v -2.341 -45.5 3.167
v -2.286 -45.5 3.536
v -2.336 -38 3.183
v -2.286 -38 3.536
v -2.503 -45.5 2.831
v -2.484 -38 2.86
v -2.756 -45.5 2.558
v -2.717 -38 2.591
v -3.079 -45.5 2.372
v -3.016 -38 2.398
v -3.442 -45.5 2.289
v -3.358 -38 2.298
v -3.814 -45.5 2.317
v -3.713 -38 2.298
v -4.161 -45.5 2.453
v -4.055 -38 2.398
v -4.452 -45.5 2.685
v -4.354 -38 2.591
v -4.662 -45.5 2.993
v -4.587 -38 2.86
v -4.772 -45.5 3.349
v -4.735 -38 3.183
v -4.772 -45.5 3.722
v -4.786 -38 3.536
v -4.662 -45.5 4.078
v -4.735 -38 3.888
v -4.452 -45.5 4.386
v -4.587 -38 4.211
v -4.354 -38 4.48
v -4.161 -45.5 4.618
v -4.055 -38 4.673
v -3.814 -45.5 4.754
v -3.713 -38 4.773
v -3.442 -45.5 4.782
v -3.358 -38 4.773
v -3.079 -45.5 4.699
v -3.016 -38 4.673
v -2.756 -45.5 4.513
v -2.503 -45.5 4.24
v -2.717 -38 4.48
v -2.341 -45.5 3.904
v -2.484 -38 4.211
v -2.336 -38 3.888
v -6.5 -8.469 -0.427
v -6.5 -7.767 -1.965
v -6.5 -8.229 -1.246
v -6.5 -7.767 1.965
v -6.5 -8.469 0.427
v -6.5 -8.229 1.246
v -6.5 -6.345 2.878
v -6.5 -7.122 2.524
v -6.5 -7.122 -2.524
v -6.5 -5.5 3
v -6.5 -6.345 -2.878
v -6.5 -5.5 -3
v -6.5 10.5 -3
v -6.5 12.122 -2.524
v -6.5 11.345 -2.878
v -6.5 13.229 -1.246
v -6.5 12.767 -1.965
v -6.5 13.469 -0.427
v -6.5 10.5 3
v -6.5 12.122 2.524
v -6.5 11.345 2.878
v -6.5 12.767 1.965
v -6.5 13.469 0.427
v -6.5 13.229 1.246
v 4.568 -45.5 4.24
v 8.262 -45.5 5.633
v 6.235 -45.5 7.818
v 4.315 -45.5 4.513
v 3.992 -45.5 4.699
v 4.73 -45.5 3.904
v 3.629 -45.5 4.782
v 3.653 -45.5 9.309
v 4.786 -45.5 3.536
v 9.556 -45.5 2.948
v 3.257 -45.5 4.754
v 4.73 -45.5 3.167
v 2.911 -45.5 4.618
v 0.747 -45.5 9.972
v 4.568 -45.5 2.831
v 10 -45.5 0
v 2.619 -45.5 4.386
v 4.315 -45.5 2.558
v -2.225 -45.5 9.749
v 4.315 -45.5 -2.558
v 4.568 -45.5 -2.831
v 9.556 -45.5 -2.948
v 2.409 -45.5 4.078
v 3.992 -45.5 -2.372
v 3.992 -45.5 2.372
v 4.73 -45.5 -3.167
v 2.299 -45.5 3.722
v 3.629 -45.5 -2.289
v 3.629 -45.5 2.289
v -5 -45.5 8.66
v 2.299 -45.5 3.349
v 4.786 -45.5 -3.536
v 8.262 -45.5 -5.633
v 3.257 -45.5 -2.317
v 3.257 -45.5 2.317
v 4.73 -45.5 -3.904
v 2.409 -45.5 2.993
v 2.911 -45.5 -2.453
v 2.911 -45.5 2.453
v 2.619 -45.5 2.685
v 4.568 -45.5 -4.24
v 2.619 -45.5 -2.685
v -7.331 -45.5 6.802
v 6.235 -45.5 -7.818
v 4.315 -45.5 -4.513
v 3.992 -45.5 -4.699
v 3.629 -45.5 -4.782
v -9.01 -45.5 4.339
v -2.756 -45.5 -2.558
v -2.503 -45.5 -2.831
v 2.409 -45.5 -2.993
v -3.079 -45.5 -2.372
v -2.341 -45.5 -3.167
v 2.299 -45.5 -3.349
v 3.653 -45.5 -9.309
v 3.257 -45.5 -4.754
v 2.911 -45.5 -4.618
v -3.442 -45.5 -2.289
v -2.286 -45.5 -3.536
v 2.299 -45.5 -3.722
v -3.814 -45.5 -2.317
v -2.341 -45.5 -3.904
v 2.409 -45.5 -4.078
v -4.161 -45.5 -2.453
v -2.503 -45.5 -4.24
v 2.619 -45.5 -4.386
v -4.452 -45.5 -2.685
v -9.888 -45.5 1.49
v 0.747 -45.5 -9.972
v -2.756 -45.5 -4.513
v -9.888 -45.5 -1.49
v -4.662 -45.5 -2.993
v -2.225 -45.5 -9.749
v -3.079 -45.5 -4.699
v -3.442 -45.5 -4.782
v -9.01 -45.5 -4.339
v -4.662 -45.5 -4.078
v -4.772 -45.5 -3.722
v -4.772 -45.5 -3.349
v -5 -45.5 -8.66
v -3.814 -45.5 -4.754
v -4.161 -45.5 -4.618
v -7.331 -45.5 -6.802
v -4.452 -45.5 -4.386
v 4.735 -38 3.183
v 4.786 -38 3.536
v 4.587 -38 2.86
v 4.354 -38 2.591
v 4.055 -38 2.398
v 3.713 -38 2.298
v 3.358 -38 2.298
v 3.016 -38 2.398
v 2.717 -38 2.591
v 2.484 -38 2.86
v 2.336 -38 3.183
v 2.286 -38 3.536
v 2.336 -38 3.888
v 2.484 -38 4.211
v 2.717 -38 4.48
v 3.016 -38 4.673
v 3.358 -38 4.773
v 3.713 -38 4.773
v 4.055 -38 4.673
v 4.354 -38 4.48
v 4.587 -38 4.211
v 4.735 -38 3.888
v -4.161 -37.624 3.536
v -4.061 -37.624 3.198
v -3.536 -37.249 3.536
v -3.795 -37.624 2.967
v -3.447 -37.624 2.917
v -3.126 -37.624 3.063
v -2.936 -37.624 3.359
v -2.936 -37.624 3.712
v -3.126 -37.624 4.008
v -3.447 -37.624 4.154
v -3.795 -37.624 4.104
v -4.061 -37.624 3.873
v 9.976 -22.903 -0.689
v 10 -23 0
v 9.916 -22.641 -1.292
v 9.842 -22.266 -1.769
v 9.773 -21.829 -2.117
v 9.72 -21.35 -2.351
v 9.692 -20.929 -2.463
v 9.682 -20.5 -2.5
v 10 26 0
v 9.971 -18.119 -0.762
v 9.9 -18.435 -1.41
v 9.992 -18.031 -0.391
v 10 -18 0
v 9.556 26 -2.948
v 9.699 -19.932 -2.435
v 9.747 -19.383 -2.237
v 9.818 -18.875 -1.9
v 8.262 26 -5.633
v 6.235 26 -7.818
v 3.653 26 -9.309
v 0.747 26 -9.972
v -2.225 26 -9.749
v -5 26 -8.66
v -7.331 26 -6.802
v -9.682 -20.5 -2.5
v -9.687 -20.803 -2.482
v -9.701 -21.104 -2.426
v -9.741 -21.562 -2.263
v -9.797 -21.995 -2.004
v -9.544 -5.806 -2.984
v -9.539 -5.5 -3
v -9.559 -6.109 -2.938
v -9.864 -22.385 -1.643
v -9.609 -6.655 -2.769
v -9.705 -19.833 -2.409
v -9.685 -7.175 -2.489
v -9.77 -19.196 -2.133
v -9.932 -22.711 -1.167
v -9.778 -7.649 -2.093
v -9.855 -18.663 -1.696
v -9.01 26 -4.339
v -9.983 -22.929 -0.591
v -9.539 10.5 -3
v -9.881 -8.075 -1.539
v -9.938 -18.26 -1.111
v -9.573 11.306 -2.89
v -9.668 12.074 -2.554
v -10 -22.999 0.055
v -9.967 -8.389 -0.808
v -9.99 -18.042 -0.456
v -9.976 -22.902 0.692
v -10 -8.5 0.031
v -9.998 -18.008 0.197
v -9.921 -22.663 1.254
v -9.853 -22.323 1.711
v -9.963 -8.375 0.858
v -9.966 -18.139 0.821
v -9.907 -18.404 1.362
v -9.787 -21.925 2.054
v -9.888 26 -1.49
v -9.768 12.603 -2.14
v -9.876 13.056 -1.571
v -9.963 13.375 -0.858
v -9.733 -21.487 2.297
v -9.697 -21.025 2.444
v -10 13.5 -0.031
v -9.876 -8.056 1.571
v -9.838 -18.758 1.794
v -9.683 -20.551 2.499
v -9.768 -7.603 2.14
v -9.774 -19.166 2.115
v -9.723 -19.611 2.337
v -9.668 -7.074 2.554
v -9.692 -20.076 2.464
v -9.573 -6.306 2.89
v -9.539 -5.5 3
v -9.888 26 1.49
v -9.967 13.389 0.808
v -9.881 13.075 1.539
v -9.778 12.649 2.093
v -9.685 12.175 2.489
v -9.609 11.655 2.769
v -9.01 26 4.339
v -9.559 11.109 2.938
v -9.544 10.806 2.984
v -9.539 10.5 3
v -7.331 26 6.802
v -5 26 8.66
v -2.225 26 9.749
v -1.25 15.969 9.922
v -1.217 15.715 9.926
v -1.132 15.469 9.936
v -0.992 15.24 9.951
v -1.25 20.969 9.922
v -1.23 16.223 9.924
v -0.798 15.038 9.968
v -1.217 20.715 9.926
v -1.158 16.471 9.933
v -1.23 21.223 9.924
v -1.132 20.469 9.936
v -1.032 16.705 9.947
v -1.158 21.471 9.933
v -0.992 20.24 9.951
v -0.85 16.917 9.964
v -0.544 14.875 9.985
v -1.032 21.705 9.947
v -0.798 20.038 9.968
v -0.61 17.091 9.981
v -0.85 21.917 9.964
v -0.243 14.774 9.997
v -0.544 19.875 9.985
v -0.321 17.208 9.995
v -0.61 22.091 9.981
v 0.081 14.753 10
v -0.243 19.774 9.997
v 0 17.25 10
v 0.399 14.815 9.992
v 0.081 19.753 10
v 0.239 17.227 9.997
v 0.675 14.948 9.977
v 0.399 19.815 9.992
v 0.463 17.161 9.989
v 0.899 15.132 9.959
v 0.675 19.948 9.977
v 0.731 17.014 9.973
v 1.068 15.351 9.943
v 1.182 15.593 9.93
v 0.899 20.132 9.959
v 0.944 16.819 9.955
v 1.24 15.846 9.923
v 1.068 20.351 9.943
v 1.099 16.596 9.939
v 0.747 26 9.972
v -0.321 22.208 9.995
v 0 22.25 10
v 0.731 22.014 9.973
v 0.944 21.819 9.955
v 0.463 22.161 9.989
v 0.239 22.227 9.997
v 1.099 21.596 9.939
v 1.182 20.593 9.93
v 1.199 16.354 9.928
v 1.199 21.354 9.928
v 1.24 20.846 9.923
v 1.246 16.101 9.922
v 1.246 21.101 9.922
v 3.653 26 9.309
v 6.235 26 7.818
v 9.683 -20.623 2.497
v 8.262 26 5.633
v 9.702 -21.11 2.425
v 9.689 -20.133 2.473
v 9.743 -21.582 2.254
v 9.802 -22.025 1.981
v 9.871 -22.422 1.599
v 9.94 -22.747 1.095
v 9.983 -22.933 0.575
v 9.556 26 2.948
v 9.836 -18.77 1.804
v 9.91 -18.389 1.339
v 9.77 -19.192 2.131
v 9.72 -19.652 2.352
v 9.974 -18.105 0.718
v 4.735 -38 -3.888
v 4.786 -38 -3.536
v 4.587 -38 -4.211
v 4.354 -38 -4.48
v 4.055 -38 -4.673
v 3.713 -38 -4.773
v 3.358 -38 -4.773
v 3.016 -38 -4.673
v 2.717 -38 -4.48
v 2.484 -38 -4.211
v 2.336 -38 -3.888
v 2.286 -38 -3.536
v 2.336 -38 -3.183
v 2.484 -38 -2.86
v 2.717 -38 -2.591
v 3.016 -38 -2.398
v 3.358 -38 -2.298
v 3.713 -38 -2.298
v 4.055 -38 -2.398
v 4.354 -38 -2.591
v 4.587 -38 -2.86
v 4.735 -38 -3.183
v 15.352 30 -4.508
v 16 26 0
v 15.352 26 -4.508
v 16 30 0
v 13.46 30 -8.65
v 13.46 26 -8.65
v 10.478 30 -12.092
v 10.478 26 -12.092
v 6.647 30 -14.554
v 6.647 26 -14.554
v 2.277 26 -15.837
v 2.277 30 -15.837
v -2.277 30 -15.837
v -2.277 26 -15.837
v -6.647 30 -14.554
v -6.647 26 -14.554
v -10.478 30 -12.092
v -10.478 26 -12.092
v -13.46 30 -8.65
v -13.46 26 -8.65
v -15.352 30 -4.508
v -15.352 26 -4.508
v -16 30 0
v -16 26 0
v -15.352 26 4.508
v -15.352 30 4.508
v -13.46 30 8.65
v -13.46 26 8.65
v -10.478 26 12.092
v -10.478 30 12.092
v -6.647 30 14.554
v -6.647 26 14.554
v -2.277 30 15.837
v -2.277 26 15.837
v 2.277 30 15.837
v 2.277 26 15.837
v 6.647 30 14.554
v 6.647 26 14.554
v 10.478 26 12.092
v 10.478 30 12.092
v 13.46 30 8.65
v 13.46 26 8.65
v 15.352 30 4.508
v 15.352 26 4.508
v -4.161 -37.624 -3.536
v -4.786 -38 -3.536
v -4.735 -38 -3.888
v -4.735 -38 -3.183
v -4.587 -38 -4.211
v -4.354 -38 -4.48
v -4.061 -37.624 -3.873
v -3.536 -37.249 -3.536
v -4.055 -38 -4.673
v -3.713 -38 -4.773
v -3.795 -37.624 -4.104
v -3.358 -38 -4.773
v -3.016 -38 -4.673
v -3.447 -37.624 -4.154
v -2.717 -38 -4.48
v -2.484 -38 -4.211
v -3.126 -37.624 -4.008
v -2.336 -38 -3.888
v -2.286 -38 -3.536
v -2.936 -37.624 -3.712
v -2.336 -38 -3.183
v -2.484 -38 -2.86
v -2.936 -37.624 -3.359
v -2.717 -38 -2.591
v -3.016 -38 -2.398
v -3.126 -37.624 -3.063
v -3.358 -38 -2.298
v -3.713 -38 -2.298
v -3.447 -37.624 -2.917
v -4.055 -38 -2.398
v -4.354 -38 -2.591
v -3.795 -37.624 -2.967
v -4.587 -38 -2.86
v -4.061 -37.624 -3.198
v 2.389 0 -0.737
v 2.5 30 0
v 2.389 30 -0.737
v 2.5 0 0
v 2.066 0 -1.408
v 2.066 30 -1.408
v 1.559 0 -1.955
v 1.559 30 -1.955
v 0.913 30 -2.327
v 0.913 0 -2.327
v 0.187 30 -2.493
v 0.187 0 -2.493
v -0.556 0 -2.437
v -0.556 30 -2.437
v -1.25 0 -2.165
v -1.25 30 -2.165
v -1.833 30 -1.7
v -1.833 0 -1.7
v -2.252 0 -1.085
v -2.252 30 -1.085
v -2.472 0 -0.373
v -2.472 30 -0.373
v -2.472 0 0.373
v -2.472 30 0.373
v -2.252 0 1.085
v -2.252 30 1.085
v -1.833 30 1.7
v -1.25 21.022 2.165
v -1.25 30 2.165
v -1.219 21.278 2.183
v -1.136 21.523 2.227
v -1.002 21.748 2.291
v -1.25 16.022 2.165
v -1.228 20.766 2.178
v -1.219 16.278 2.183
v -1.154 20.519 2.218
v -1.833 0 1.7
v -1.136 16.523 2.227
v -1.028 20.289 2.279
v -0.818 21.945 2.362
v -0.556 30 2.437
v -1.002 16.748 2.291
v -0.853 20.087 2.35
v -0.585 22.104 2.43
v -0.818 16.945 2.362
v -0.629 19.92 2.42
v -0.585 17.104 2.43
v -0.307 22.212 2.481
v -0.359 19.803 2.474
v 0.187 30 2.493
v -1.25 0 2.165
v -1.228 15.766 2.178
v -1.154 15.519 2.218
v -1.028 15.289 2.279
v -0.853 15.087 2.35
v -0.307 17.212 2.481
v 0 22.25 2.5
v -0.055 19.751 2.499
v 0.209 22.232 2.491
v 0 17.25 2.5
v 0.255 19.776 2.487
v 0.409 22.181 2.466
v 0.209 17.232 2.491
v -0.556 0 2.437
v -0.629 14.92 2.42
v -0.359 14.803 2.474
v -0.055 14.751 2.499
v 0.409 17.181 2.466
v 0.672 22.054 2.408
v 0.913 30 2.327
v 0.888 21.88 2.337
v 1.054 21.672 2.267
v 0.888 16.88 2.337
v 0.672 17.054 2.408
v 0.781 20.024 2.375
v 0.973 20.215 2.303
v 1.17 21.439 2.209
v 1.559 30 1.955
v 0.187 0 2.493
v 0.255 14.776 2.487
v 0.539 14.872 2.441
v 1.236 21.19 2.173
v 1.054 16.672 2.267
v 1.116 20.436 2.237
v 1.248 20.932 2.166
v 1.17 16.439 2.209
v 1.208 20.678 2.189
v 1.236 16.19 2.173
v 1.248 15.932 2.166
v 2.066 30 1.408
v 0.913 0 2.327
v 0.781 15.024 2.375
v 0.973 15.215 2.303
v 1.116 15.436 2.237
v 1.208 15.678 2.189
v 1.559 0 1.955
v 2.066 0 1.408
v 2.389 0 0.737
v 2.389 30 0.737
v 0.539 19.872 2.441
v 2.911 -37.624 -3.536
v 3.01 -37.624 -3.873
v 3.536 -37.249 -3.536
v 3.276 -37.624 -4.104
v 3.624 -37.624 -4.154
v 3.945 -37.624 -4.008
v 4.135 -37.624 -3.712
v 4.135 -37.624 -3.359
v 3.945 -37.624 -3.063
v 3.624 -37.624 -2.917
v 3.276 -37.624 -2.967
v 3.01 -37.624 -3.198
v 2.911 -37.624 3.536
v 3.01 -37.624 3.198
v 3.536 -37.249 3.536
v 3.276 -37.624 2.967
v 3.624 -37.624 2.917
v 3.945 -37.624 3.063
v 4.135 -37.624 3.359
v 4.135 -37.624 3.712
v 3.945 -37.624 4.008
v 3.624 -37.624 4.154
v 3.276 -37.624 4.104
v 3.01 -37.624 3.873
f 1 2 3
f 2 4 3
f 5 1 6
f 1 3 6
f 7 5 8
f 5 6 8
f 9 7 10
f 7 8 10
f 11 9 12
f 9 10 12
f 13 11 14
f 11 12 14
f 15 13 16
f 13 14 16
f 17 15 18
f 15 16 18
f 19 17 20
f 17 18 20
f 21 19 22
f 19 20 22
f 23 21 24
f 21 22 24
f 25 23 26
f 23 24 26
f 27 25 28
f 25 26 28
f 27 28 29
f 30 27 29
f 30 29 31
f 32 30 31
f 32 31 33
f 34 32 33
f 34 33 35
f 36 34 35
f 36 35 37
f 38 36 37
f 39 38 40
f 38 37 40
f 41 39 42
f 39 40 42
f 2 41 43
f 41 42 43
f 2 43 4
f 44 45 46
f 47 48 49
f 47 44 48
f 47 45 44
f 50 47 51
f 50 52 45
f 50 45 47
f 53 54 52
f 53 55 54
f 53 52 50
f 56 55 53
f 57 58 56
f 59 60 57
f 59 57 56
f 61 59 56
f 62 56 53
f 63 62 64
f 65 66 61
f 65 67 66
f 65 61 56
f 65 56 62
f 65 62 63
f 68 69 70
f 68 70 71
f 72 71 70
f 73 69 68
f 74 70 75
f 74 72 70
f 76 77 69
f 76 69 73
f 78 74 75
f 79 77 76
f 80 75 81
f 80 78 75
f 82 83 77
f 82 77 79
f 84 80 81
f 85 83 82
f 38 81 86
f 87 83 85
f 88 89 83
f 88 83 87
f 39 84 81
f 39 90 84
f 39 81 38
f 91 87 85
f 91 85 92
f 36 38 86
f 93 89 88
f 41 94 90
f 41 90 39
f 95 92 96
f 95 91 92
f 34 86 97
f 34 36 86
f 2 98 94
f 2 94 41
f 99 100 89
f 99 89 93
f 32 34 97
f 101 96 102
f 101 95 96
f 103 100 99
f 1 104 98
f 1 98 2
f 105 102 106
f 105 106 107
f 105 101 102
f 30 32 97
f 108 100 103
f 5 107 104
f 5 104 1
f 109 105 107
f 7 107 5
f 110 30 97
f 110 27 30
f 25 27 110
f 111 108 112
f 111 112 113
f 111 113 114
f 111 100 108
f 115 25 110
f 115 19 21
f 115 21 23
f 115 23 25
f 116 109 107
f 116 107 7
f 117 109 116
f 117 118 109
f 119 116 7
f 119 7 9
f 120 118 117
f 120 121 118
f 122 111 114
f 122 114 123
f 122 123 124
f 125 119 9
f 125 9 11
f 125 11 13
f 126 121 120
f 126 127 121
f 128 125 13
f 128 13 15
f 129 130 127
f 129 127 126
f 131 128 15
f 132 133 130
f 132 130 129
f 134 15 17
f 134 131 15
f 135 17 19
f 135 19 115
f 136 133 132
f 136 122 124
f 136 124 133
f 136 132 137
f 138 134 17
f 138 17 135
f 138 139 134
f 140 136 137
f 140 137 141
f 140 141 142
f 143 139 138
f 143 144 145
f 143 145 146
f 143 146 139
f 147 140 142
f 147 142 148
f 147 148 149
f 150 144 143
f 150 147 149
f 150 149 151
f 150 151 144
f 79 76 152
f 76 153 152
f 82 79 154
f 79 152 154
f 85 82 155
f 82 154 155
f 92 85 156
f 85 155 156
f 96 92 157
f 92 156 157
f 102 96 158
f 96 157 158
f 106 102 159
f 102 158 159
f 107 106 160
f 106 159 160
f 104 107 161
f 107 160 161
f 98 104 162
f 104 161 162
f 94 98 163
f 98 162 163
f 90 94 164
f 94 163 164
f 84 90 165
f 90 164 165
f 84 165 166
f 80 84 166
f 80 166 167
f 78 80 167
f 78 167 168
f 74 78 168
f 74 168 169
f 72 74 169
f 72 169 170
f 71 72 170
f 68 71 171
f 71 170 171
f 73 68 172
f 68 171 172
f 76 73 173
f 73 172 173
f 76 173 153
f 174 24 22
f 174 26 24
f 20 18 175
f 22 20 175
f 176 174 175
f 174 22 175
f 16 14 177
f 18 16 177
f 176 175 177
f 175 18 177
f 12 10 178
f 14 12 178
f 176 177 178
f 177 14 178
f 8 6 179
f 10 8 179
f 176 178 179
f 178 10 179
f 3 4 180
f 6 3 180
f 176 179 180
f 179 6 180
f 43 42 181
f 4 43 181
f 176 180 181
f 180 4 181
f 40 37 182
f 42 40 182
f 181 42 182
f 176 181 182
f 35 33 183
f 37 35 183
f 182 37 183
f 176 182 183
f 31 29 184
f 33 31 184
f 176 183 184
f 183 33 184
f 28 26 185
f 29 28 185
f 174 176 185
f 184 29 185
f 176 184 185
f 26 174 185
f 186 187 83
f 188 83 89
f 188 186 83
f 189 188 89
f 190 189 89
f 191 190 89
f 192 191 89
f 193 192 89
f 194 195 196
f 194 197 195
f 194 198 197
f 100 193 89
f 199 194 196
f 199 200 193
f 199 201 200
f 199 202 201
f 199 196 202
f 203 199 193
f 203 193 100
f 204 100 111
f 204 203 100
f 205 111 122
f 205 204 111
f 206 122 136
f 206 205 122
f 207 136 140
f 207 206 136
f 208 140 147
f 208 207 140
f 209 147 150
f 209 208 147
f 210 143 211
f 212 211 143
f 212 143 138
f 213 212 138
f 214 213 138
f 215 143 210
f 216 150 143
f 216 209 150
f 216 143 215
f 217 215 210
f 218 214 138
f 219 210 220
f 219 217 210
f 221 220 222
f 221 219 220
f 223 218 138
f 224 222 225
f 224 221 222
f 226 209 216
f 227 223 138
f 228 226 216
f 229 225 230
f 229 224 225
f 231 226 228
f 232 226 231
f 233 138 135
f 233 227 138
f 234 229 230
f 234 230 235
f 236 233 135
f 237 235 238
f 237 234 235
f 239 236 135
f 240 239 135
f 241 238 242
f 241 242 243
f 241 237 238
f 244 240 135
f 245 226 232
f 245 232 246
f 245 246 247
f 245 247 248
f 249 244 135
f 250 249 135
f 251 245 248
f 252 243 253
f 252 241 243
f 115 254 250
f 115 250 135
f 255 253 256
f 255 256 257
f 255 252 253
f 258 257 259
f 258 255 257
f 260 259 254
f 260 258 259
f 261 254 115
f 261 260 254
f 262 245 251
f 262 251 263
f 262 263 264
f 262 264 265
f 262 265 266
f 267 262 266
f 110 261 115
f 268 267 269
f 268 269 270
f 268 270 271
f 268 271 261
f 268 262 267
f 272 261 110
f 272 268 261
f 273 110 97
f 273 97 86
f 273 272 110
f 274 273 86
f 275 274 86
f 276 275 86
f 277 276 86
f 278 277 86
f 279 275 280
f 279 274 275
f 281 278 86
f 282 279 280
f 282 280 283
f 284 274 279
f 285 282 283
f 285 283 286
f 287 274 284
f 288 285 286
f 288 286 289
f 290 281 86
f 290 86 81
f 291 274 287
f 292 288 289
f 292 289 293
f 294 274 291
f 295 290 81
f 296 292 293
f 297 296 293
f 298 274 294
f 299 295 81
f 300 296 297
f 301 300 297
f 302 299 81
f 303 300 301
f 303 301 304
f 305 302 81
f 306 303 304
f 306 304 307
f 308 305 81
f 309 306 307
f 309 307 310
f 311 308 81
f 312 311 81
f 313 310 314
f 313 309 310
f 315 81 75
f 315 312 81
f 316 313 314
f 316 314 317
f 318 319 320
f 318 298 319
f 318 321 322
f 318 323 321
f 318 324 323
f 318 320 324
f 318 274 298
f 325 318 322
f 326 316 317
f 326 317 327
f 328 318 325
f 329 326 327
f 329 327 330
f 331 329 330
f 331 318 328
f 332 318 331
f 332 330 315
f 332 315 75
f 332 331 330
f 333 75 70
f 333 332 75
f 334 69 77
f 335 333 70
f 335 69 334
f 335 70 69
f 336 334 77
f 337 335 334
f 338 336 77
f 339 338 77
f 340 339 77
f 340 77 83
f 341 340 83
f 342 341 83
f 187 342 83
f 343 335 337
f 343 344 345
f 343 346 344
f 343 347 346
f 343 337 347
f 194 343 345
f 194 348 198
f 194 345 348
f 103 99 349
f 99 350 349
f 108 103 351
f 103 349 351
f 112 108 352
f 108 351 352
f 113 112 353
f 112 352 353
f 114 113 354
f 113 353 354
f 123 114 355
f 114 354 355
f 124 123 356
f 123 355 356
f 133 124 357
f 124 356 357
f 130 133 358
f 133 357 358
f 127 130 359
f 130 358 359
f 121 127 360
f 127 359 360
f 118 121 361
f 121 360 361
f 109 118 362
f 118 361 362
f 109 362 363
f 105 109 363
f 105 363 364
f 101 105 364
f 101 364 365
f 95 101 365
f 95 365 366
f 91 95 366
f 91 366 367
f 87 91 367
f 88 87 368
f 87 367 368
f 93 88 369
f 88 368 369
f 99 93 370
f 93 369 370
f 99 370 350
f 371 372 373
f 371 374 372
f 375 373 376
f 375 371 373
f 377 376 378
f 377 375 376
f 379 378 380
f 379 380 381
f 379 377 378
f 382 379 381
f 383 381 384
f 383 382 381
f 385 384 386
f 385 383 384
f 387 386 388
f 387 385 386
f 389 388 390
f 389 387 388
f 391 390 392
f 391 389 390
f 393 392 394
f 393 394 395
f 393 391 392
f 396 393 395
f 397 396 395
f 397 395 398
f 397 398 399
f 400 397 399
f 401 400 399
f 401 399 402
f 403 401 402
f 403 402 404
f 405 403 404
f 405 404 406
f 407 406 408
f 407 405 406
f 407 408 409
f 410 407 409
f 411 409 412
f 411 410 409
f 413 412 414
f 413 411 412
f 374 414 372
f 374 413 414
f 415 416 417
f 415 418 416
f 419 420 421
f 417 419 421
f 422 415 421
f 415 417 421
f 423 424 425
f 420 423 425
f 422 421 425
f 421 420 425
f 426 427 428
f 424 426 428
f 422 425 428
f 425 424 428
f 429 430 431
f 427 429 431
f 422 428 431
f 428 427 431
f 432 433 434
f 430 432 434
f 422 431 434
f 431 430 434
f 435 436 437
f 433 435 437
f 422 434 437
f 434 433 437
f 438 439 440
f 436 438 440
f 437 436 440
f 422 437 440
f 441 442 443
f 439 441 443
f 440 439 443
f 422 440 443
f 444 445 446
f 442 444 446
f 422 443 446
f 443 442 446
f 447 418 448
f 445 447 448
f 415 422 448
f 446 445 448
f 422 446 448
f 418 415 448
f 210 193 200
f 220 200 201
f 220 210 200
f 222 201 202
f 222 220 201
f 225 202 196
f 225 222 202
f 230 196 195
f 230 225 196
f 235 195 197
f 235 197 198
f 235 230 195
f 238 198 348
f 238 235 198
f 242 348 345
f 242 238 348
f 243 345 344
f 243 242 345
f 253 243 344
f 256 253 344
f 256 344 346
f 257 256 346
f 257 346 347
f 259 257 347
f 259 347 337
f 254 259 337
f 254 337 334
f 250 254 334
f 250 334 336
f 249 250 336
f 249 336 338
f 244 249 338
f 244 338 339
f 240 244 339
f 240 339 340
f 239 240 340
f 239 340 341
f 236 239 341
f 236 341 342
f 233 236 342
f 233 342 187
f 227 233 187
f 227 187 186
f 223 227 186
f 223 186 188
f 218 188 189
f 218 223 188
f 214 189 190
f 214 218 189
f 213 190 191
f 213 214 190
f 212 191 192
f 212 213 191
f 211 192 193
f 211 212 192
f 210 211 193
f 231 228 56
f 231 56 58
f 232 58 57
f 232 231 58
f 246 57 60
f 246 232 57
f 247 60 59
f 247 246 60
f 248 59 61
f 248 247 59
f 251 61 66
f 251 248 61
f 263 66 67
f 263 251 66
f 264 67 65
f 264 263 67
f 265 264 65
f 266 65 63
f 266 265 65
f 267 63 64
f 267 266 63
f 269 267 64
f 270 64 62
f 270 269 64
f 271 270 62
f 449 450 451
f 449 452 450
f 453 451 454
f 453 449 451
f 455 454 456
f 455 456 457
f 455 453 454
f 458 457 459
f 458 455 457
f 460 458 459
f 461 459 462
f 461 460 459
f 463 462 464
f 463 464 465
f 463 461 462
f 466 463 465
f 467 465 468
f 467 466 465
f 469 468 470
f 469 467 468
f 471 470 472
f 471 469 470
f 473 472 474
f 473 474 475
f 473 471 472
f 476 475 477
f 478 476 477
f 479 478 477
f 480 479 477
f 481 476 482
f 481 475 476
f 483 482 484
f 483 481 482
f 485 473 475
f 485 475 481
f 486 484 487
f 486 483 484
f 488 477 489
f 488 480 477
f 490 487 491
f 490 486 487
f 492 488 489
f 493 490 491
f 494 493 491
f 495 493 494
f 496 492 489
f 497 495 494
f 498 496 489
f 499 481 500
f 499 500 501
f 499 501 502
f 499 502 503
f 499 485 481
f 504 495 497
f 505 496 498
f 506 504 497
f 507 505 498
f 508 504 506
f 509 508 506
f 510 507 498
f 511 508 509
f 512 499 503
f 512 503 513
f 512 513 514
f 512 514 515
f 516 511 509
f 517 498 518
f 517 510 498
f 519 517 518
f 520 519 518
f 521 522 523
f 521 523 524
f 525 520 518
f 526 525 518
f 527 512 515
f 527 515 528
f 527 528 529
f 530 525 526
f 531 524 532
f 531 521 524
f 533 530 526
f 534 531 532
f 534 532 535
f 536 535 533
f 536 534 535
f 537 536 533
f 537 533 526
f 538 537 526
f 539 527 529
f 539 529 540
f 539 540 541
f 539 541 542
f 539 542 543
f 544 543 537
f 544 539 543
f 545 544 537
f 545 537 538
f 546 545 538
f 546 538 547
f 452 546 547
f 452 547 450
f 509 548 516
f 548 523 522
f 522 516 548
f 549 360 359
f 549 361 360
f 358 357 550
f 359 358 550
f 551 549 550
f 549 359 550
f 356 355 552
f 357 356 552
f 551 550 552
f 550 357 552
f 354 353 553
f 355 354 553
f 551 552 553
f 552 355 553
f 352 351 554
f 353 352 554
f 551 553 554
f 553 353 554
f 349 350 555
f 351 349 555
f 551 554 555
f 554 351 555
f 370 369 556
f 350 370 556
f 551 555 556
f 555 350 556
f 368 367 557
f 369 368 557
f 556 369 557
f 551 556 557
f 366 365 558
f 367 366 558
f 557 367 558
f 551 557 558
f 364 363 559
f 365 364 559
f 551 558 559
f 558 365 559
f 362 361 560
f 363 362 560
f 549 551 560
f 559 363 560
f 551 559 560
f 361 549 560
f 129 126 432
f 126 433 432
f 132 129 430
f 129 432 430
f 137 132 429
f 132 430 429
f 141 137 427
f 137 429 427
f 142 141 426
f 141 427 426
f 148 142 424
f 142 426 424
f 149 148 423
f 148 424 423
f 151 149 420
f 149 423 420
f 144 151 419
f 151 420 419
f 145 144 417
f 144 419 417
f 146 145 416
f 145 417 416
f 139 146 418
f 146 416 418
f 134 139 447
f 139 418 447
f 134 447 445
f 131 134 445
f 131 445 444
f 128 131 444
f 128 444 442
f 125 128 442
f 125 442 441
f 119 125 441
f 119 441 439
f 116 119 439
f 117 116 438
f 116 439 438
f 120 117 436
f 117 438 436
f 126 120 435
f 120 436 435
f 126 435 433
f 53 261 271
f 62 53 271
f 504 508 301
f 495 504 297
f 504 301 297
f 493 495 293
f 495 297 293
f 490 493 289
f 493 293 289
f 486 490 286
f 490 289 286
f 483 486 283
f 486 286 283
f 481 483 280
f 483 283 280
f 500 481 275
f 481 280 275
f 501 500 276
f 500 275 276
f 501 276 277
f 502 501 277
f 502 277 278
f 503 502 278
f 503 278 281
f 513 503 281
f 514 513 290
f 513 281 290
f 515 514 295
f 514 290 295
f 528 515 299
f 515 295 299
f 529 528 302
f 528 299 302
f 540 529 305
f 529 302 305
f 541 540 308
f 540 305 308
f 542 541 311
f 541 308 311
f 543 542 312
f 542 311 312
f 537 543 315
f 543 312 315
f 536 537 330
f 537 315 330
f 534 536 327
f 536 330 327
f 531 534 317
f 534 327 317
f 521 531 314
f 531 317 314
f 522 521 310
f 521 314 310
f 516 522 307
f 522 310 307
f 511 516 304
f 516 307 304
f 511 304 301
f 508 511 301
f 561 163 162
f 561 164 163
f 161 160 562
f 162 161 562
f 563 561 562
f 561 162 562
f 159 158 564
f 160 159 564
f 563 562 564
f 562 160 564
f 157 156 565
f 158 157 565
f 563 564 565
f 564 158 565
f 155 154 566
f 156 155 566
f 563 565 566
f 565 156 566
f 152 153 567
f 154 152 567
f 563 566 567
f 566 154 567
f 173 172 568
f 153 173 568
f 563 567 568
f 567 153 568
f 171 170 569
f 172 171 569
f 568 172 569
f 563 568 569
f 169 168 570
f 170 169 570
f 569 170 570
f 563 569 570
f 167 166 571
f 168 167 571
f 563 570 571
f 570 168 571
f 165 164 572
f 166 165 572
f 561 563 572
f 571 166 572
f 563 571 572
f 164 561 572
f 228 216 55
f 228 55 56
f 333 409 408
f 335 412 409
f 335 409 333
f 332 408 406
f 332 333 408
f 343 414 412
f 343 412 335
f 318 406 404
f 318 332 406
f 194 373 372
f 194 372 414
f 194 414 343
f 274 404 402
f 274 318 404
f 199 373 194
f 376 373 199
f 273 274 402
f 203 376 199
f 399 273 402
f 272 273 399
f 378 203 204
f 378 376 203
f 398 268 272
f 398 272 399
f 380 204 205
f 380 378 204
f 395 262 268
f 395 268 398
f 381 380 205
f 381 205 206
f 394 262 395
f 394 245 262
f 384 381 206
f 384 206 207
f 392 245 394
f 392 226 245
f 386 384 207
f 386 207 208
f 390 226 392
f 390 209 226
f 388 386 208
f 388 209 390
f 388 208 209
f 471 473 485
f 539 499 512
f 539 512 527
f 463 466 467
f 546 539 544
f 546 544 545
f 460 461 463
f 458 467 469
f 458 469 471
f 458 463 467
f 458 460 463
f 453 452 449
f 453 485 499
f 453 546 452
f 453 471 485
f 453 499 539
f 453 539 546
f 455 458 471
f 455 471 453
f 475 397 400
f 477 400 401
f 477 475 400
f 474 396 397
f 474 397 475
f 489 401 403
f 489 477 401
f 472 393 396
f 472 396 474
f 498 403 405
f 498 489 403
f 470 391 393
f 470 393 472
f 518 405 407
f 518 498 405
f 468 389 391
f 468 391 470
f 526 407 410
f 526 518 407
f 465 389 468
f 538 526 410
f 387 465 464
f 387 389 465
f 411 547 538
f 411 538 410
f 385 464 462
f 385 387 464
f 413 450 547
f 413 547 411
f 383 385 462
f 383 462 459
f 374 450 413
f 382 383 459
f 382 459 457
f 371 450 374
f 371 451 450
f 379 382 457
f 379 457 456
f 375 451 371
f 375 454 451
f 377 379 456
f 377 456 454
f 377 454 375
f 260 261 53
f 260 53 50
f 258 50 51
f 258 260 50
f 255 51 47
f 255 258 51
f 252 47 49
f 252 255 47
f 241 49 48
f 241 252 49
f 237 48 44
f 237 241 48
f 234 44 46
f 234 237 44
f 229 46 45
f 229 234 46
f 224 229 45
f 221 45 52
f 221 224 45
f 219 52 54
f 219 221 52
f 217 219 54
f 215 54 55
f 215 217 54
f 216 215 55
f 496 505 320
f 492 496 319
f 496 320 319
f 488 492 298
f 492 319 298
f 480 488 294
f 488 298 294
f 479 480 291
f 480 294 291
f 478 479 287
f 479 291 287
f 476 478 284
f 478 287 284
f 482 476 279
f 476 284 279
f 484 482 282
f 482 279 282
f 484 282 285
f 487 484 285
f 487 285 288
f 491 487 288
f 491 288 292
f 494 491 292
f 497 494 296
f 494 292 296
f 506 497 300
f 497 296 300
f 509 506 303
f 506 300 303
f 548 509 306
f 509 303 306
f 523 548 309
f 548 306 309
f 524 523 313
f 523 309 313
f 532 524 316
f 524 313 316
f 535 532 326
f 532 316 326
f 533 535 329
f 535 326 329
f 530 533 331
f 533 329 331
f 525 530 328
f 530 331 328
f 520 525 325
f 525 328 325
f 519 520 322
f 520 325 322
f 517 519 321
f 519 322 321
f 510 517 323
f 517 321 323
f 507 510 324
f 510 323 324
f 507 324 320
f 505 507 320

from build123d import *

# Parameters (mm, degrees)
M3_TAPPED_HOLE2_D          = 2.5
M3_TAPPED_HOLE2_DEPTH      = 7.5
M3_TAPPED_HOLE2_TIP        = 0.751075774
SKETCH4_W                  = 6
SKETCH4_H                  = 16
CUT_EXTRUDE1_DEPTH         = 3.5
SKETCH6_W                  = 1.25
SKETCH6_H                  = 16
M3_TAPPED_HOLE1_AT_2_COUNT = 2
M3_TAPPED_HOLE1_AT_2_PITCH = 5
CUT_EXTRUDE2_DEPTH         = 51.815844075
CUT_EXTRUDE2_DEPTH_BACK    = 51.815844075
SKETCH8_R                  = 2.5


with BuildPart() as part:
    # Sketch1 → Revolve1 (revolve)
    with BuildSketch(Plane.XY):
        Polygon((2.5, 30), (2.5, 0), (0, 0), (0, -45.5), (10, -45.5), (10, 26), (16, 26), (16, 30), align=None)
    revolve(axis=Axis((0, -45.5, 0), (0, 1, 0)))

    # M3 Tapped Hole2
    with Locations(Plane(origin=(0, -45.5, 0), x_dir=(-1, 0, 0), z_dir=(0, -1, 0))):
        with Locations((-3.535533906, 3.535533906), (-3.535533906, -3.535533906), (3.535533906, -3.535533906), (3.535533906, 3.535533906)):
            Hole(M3_TAPPED_HOLE2_D / 2, depth=M3_TAPPED_HOLE2_DEPTH)
            with Locations((0, 0, -(M3_TAPPED_HOLE2_DEPTH + M3_TAPPED_HOLE2_TIP / 2))):  # 118° drill point
                Cone(0, M3_TAPPED_HOLE2_D / 2, M3_TAPPED_HOLE2_TIP, mode=Mode.SUBTRACT)

    # Sketch4 → Cut-Extrude1 (cut)
    with BuildSketch(Plane.ZY.offset(10)):
        with Locations((0, 2.5)):
            Rectangle(SKETCH4_W, SKETCH4_H)
        with BuildLine():
            ThreePointArc((-3, 10.5), (0, 13.5), (3, 10.5))
            Line((3, 10.5), (-3, 10.5))
        make_face()
        with BuildLine():
            Line((-3, -5.5), (3, -5.5))
            ThreePointArc((3, -5.5), (0, -8.5), (-3, -5.5))
        make_face()
    extrude(amount=-CUT_EXTRUDE1_DEPTH, mode=Mode.SUBTRACT)

    # Sketch6 → M3 Tapped Hole1 (revolve, cut)
    with BuildSketch(Plane(origin=(0, 21, 0), x_dir=(0, 1, 0), z_dir=(1, 0, 0))):
        with Locations((0.625, 8)):
            Rectangle(SKETCH6_W, SKETCH6_H)
    m3_tapped_hole1 = revolve(axis=Axis((0, 21, -6.35), (0, 0, 1)), mode=Mode.SUBTRACT)

    # M3 Tapped Hole1 at 2: M3 Tapped Hole1 ×2
    with Locations(*[(0, -i * M3_TAPPED_HOLE1_AT_2_PITCH, 0) for i in range(1, M3_TAPPED_HOLE1_AT_2_COUNT)]):
        add(m3_tapped_hole1, mode=Mode.SUBTRACT)

    # Sketch8 → Cut-Extrude2 (cut, two sides: drawn at the far end of the back side and taken through both)
    with BuildSketch(Plane(origin=(0, 0, 0), x_dir=(0, 0, -1), z_dir=(1, 0, 0)).offset(-CUT_EXTRUDE2_DEPTH_BACK)):
        with Locations((0, -20.5)):
            Circle(SKETCH8_R)
    extrude(amount=CUT_EXTRUDE2_DEPTH + CUT_EXTRUDE2_DEPTH_BACK, mode=Mode.SUBTRACT)


solid = part.part
